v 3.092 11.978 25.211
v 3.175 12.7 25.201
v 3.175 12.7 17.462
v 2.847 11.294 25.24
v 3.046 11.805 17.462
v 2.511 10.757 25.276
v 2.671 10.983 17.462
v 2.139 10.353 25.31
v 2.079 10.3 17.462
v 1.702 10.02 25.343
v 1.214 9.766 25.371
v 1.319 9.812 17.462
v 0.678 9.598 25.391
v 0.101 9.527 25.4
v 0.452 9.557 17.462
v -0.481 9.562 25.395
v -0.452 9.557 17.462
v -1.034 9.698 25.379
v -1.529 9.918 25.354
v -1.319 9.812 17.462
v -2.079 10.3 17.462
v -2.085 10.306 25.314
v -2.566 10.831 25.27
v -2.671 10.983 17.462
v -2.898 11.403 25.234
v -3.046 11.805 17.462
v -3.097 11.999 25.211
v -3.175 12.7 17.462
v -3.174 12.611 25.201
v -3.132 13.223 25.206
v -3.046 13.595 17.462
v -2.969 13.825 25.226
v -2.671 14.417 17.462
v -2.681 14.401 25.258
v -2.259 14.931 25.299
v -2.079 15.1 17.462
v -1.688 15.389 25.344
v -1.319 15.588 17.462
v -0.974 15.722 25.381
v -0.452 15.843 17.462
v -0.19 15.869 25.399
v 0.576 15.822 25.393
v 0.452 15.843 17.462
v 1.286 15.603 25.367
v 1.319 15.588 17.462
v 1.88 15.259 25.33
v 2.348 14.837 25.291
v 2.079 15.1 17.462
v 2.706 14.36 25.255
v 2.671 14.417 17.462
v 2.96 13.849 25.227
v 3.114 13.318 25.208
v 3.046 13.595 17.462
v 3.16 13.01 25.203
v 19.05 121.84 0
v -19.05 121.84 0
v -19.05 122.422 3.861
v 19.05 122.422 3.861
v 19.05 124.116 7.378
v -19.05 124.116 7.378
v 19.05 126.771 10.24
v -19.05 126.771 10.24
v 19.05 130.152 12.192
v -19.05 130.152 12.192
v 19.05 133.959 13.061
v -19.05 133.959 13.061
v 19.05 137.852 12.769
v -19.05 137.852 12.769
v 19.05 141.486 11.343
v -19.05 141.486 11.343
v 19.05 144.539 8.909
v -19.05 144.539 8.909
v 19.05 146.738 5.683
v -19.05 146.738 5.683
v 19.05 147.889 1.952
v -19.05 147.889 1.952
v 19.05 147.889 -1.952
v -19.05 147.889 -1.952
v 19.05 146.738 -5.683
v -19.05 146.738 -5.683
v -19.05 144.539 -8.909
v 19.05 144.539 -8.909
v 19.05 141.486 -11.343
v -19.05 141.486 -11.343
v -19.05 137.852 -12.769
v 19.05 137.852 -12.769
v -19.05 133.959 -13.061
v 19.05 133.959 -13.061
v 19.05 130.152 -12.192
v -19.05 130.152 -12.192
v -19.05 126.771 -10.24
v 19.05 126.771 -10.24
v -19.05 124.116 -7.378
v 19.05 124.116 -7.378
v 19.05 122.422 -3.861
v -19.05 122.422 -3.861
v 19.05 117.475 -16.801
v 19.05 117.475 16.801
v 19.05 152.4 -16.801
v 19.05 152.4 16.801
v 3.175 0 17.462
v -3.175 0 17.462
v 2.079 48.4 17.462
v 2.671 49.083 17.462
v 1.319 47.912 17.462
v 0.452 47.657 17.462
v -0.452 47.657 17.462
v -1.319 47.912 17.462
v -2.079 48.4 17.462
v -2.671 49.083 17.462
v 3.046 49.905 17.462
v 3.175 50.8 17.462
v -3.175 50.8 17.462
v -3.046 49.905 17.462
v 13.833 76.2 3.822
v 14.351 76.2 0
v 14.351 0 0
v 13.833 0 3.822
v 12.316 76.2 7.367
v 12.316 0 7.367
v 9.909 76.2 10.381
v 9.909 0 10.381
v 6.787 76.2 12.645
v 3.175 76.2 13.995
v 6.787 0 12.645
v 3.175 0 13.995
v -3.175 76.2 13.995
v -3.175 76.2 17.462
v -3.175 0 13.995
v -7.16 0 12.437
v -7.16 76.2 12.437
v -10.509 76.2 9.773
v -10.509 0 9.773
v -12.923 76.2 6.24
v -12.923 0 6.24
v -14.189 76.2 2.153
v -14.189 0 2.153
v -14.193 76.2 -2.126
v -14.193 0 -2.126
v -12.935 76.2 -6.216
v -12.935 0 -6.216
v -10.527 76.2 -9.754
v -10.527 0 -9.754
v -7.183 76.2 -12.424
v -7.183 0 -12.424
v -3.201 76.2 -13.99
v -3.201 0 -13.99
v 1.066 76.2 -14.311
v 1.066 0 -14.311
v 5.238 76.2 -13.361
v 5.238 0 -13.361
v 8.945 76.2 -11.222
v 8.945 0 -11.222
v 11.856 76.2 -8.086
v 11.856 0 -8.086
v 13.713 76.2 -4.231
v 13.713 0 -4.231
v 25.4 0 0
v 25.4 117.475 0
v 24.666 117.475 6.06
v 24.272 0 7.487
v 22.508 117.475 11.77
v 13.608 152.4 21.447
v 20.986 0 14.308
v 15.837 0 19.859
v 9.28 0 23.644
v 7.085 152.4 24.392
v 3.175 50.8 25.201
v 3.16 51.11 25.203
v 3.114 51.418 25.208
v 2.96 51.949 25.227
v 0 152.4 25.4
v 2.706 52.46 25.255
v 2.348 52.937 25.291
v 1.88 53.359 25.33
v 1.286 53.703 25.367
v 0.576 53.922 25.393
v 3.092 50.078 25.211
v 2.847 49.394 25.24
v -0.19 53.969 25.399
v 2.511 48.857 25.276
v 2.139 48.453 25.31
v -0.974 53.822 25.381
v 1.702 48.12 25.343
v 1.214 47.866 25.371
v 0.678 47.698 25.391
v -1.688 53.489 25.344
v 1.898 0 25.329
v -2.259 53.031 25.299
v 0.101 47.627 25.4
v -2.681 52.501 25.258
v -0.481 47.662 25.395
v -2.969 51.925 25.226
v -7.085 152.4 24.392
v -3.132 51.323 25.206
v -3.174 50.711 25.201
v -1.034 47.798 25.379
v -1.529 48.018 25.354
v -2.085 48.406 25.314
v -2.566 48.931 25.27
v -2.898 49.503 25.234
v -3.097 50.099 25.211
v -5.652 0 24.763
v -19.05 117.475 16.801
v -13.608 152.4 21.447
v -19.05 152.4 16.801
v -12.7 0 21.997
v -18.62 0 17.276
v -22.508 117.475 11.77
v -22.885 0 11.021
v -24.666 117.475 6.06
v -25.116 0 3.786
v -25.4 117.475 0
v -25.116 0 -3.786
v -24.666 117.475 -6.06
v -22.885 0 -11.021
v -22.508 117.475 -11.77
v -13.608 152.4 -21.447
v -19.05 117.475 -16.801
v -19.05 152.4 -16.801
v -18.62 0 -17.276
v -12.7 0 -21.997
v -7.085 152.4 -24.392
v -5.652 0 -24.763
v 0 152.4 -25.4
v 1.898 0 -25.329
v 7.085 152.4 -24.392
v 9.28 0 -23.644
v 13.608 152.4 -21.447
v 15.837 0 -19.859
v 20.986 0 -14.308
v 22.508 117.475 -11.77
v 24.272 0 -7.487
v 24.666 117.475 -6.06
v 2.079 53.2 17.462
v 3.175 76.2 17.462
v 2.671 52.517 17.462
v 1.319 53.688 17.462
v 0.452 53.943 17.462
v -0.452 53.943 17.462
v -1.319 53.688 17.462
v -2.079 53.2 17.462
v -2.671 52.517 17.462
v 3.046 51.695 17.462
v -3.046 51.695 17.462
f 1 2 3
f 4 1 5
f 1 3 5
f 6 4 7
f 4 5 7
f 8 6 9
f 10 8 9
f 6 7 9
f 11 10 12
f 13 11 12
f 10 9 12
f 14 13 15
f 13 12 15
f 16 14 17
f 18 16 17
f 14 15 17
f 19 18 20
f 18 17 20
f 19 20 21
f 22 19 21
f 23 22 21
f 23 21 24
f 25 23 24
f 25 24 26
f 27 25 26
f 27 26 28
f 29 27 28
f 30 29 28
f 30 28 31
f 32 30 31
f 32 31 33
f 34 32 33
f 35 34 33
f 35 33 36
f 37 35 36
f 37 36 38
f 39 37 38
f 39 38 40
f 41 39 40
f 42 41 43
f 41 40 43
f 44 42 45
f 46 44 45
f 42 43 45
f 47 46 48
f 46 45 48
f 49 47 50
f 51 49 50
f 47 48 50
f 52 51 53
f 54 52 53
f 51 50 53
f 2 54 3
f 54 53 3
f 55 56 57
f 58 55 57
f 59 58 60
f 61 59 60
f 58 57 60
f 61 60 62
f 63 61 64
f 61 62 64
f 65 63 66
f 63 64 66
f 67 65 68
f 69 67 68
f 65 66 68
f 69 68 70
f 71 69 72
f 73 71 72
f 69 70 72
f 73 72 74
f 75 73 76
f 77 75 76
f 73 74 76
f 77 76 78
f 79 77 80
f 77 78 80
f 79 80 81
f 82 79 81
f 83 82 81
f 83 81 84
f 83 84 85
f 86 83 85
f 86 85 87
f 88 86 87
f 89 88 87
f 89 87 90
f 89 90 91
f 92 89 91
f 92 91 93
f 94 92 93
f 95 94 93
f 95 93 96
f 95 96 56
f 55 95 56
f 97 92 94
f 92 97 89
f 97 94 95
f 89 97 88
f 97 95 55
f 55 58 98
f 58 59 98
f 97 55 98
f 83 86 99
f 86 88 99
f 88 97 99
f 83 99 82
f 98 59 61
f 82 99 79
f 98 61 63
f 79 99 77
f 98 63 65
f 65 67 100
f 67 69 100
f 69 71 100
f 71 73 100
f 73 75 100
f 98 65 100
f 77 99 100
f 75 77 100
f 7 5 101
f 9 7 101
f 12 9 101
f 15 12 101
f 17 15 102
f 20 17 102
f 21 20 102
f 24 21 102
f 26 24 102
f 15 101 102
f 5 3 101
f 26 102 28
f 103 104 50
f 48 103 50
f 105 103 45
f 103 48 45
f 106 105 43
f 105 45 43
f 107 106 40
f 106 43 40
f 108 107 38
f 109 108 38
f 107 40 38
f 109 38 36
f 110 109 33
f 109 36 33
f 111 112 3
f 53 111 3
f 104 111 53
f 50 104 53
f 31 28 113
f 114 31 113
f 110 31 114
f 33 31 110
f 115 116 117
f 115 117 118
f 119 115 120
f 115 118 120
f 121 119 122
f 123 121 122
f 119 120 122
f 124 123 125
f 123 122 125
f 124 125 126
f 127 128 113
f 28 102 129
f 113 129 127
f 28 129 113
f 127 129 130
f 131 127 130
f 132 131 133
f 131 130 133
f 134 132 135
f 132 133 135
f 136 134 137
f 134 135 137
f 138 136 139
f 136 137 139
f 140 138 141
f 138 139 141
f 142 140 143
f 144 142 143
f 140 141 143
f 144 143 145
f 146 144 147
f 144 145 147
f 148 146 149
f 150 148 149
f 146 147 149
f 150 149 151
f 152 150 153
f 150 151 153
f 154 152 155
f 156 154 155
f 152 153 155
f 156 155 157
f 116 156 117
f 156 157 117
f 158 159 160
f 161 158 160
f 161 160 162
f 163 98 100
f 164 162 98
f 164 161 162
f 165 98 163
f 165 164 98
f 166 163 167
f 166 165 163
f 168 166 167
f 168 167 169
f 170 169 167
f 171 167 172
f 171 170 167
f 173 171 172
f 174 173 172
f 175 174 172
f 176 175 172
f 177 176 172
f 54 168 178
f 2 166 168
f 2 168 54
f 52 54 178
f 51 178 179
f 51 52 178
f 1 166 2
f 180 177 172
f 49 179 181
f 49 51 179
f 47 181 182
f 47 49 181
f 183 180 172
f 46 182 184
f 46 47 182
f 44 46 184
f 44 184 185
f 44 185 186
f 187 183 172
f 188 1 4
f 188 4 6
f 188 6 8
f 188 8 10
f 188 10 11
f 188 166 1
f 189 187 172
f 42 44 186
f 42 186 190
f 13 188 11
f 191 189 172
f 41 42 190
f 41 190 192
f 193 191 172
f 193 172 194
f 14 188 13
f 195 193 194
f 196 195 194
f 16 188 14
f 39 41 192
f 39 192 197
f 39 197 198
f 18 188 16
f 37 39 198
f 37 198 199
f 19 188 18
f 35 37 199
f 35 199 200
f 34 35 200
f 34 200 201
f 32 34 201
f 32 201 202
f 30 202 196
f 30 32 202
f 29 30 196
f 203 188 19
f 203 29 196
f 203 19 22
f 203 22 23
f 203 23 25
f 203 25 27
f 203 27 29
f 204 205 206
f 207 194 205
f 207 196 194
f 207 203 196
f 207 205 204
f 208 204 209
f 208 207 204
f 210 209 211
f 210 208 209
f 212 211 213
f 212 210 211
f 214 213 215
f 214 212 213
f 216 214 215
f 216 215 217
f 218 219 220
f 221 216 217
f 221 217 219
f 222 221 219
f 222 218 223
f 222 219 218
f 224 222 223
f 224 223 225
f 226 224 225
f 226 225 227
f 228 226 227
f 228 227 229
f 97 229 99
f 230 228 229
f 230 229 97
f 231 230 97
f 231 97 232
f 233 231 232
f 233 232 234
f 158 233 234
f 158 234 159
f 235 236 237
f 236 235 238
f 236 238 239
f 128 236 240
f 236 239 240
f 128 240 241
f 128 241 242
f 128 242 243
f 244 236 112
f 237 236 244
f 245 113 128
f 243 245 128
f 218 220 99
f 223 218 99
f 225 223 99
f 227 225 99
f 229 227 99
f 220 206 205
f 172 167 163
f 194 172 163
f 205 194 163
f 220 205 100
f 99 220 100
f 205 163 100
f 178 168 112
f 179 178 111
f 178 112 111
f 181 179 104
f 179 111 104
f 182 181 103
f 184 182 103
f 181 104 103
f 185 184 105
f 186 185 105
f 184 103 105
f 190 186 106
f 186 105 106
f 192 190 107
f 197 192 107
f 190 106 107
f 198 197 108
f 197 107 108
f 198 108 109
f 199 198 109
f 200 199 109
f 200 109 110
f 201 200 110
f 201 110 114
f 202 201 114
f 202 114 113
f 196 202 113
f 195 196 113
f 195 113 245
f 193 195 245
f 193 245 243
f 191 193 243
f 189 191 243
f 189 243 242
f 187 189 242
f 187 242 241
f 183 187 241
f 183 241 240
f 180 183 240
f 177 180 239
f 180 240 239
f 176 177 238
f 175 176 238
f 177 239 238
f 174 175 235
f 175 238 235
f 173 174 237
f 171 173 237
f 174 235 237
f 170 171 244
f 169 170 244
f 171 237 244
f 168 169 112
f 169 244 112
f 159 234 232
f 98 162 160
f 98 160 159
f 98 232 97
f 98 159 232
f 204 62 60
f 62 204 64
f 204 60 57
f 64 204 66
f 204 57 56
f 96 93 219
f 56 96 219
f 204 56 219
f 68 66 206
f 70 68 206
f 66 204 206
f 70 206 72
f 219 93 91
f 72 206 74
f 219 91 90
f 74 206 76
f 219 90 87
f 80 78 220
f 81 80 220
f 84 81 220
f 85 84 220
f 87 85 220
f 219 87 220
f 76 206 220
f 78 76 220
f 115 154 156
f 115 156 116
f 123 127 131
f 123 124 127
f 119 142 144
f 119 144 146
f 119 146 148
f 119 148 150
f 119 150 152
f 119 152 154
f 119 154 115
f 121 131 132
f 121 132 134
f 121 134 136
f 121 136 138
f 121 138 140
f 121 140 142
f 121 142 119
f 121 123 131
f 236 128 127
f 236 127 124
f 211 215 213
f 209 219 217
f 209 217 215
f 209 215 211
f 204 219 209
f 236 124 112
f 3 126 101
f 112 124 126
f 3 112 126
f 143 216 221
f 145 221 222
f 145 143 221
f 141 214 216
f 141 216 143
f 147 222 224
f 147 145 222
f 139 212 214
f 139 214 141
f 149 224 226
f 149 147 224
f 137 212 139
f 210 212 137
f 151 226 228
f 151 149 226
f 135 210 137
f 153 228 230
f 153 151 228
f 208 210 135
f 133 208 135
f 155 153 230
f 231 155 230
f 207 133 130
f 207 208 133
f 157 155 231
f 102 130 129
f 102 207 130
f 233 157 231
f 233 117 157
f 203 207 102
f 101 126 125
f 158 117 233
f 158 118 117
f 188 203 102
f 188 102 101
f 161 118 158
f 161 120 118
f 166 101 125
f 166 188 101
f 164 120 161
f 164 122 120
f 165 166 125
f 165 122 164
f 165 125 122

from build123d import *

# Parameters (mm, degrees)
F0_R     = 25.4
F1_DEPTH = 152.4
F3_DEPTH = 76.2
F5_DEPTH = 7.9375
F7_DEPTH = 34.925
F9_D     = 26.19502


with BuildPart() as f1:
    # F0 (on Front) → F1 (new body)
    with BuildSketch(Plane.XZ):
        Circle(F0_R)
    extrude(amount=-F1_DEPTH)

    # F2 (on face) → F3 (cut)
    with BuildSketch(Plane.XZ):
        with BuildLine():
            ThreePointArc((-3.175, 13.995376951), (-8.9550761024, -11.214179105), (14.351, 0))
            ThreePointArc((14.351, 0), (11.214179105, 8.9550761024), (3.175, 13.995376951))
            Line((3.175, 13.995376951), (3.175, 11.1125))
            Line((3.175, 11.1125), (-3.175, 11.1125))
            Line((-3.175, 11.1125), (-3.175, 13.995376951))
        make_face()
        with BuildLine():
            Line((3.175, 11.1125), (3.175, 13.995376951))
            ThreePointArc((3.175, 13.995376951), (0, 14.351), (-3.175, 13.995376951))
            Line((-3.175, 13.995376951), (-3.175, 11.1125))
            Line((-3.175, 11.1125), (3.175, 11.1125))
        make_face()
        with BuildLine():
            ThreePointArc((-3.175, 13.995376951), (0, 14.351), (3.175, 13.995376951))
            Line((3.175, 13.995376951), (3.175, 17.4625))
            Line((3.175, 17.4625), (-3.175, 17.4625))
            Line((-3.175, 17.4625), (-3.175, 13.995376951))
        make_face()
    extrude(amount=-F3_DEPTH, mode=Mode.SUBTRACT)

    # F4 (on face) → F5 (cut, through all)
    with BuildSketch(Plane(origin=(0, 0, 17.4625), x_dir=(1, 0, 0), z_dir=(0, 0, -1))):
        with BuildLine():
            ThreePointArc((-3.175, -12.7), (0, -15.875), (3.175, -12.7))
            ThreePointArc((3.175, -12.7), (0, -9.525), (-3.175, -12.7))
        make_face()
        with BuildLine():
            ThreePointArc((-3.175, -50.8), (0, -53.975), (3.175, -50.8))
            ThreePointArc((3.175, -50.8), (0, -47.625), (-3.175, -50.8))
        make_face()
    extrude(amount=-F5_DEPTH, mode=Mode.SUBTRACT)

    # F6 (on face) → F7 (cut)
    with BuildSketch(Plane(origin=(0, 152.4, 0), x_dir=(-1, 0, 0), z_dir=(0, 1, 0))):
        with BuildLine():
            Line((-19.05, -16.8005208253), (-19.05, 16.8005208253))
            ThreePointArc((-19.05, 16.8005208253), (-25.4, 0), (-19.05, -16.8005208253))
        make_face()
        with BuildLine():
            ThreePointArc((19.05, -16.8005208253), (23.759524406, -8.9802561211), (25.4, 0))
            ThreePointArc((25.4, 0), (23.759524406, 8.9802561211), (19.05, 16.8005208253))
            Line((19.05, 16.8005208253), (19.05, -16.8005208253))
        make_face()
    extrude(amount=-F7_DEPTH, mode=Mode.SUBTRACT)

    # F9 (through all)
    with Locations(Plane.YZ.offset(19.05)):
        with Locations((134.9375, 0)):
            Hole(F9_D / 2)


solid = f1.part
